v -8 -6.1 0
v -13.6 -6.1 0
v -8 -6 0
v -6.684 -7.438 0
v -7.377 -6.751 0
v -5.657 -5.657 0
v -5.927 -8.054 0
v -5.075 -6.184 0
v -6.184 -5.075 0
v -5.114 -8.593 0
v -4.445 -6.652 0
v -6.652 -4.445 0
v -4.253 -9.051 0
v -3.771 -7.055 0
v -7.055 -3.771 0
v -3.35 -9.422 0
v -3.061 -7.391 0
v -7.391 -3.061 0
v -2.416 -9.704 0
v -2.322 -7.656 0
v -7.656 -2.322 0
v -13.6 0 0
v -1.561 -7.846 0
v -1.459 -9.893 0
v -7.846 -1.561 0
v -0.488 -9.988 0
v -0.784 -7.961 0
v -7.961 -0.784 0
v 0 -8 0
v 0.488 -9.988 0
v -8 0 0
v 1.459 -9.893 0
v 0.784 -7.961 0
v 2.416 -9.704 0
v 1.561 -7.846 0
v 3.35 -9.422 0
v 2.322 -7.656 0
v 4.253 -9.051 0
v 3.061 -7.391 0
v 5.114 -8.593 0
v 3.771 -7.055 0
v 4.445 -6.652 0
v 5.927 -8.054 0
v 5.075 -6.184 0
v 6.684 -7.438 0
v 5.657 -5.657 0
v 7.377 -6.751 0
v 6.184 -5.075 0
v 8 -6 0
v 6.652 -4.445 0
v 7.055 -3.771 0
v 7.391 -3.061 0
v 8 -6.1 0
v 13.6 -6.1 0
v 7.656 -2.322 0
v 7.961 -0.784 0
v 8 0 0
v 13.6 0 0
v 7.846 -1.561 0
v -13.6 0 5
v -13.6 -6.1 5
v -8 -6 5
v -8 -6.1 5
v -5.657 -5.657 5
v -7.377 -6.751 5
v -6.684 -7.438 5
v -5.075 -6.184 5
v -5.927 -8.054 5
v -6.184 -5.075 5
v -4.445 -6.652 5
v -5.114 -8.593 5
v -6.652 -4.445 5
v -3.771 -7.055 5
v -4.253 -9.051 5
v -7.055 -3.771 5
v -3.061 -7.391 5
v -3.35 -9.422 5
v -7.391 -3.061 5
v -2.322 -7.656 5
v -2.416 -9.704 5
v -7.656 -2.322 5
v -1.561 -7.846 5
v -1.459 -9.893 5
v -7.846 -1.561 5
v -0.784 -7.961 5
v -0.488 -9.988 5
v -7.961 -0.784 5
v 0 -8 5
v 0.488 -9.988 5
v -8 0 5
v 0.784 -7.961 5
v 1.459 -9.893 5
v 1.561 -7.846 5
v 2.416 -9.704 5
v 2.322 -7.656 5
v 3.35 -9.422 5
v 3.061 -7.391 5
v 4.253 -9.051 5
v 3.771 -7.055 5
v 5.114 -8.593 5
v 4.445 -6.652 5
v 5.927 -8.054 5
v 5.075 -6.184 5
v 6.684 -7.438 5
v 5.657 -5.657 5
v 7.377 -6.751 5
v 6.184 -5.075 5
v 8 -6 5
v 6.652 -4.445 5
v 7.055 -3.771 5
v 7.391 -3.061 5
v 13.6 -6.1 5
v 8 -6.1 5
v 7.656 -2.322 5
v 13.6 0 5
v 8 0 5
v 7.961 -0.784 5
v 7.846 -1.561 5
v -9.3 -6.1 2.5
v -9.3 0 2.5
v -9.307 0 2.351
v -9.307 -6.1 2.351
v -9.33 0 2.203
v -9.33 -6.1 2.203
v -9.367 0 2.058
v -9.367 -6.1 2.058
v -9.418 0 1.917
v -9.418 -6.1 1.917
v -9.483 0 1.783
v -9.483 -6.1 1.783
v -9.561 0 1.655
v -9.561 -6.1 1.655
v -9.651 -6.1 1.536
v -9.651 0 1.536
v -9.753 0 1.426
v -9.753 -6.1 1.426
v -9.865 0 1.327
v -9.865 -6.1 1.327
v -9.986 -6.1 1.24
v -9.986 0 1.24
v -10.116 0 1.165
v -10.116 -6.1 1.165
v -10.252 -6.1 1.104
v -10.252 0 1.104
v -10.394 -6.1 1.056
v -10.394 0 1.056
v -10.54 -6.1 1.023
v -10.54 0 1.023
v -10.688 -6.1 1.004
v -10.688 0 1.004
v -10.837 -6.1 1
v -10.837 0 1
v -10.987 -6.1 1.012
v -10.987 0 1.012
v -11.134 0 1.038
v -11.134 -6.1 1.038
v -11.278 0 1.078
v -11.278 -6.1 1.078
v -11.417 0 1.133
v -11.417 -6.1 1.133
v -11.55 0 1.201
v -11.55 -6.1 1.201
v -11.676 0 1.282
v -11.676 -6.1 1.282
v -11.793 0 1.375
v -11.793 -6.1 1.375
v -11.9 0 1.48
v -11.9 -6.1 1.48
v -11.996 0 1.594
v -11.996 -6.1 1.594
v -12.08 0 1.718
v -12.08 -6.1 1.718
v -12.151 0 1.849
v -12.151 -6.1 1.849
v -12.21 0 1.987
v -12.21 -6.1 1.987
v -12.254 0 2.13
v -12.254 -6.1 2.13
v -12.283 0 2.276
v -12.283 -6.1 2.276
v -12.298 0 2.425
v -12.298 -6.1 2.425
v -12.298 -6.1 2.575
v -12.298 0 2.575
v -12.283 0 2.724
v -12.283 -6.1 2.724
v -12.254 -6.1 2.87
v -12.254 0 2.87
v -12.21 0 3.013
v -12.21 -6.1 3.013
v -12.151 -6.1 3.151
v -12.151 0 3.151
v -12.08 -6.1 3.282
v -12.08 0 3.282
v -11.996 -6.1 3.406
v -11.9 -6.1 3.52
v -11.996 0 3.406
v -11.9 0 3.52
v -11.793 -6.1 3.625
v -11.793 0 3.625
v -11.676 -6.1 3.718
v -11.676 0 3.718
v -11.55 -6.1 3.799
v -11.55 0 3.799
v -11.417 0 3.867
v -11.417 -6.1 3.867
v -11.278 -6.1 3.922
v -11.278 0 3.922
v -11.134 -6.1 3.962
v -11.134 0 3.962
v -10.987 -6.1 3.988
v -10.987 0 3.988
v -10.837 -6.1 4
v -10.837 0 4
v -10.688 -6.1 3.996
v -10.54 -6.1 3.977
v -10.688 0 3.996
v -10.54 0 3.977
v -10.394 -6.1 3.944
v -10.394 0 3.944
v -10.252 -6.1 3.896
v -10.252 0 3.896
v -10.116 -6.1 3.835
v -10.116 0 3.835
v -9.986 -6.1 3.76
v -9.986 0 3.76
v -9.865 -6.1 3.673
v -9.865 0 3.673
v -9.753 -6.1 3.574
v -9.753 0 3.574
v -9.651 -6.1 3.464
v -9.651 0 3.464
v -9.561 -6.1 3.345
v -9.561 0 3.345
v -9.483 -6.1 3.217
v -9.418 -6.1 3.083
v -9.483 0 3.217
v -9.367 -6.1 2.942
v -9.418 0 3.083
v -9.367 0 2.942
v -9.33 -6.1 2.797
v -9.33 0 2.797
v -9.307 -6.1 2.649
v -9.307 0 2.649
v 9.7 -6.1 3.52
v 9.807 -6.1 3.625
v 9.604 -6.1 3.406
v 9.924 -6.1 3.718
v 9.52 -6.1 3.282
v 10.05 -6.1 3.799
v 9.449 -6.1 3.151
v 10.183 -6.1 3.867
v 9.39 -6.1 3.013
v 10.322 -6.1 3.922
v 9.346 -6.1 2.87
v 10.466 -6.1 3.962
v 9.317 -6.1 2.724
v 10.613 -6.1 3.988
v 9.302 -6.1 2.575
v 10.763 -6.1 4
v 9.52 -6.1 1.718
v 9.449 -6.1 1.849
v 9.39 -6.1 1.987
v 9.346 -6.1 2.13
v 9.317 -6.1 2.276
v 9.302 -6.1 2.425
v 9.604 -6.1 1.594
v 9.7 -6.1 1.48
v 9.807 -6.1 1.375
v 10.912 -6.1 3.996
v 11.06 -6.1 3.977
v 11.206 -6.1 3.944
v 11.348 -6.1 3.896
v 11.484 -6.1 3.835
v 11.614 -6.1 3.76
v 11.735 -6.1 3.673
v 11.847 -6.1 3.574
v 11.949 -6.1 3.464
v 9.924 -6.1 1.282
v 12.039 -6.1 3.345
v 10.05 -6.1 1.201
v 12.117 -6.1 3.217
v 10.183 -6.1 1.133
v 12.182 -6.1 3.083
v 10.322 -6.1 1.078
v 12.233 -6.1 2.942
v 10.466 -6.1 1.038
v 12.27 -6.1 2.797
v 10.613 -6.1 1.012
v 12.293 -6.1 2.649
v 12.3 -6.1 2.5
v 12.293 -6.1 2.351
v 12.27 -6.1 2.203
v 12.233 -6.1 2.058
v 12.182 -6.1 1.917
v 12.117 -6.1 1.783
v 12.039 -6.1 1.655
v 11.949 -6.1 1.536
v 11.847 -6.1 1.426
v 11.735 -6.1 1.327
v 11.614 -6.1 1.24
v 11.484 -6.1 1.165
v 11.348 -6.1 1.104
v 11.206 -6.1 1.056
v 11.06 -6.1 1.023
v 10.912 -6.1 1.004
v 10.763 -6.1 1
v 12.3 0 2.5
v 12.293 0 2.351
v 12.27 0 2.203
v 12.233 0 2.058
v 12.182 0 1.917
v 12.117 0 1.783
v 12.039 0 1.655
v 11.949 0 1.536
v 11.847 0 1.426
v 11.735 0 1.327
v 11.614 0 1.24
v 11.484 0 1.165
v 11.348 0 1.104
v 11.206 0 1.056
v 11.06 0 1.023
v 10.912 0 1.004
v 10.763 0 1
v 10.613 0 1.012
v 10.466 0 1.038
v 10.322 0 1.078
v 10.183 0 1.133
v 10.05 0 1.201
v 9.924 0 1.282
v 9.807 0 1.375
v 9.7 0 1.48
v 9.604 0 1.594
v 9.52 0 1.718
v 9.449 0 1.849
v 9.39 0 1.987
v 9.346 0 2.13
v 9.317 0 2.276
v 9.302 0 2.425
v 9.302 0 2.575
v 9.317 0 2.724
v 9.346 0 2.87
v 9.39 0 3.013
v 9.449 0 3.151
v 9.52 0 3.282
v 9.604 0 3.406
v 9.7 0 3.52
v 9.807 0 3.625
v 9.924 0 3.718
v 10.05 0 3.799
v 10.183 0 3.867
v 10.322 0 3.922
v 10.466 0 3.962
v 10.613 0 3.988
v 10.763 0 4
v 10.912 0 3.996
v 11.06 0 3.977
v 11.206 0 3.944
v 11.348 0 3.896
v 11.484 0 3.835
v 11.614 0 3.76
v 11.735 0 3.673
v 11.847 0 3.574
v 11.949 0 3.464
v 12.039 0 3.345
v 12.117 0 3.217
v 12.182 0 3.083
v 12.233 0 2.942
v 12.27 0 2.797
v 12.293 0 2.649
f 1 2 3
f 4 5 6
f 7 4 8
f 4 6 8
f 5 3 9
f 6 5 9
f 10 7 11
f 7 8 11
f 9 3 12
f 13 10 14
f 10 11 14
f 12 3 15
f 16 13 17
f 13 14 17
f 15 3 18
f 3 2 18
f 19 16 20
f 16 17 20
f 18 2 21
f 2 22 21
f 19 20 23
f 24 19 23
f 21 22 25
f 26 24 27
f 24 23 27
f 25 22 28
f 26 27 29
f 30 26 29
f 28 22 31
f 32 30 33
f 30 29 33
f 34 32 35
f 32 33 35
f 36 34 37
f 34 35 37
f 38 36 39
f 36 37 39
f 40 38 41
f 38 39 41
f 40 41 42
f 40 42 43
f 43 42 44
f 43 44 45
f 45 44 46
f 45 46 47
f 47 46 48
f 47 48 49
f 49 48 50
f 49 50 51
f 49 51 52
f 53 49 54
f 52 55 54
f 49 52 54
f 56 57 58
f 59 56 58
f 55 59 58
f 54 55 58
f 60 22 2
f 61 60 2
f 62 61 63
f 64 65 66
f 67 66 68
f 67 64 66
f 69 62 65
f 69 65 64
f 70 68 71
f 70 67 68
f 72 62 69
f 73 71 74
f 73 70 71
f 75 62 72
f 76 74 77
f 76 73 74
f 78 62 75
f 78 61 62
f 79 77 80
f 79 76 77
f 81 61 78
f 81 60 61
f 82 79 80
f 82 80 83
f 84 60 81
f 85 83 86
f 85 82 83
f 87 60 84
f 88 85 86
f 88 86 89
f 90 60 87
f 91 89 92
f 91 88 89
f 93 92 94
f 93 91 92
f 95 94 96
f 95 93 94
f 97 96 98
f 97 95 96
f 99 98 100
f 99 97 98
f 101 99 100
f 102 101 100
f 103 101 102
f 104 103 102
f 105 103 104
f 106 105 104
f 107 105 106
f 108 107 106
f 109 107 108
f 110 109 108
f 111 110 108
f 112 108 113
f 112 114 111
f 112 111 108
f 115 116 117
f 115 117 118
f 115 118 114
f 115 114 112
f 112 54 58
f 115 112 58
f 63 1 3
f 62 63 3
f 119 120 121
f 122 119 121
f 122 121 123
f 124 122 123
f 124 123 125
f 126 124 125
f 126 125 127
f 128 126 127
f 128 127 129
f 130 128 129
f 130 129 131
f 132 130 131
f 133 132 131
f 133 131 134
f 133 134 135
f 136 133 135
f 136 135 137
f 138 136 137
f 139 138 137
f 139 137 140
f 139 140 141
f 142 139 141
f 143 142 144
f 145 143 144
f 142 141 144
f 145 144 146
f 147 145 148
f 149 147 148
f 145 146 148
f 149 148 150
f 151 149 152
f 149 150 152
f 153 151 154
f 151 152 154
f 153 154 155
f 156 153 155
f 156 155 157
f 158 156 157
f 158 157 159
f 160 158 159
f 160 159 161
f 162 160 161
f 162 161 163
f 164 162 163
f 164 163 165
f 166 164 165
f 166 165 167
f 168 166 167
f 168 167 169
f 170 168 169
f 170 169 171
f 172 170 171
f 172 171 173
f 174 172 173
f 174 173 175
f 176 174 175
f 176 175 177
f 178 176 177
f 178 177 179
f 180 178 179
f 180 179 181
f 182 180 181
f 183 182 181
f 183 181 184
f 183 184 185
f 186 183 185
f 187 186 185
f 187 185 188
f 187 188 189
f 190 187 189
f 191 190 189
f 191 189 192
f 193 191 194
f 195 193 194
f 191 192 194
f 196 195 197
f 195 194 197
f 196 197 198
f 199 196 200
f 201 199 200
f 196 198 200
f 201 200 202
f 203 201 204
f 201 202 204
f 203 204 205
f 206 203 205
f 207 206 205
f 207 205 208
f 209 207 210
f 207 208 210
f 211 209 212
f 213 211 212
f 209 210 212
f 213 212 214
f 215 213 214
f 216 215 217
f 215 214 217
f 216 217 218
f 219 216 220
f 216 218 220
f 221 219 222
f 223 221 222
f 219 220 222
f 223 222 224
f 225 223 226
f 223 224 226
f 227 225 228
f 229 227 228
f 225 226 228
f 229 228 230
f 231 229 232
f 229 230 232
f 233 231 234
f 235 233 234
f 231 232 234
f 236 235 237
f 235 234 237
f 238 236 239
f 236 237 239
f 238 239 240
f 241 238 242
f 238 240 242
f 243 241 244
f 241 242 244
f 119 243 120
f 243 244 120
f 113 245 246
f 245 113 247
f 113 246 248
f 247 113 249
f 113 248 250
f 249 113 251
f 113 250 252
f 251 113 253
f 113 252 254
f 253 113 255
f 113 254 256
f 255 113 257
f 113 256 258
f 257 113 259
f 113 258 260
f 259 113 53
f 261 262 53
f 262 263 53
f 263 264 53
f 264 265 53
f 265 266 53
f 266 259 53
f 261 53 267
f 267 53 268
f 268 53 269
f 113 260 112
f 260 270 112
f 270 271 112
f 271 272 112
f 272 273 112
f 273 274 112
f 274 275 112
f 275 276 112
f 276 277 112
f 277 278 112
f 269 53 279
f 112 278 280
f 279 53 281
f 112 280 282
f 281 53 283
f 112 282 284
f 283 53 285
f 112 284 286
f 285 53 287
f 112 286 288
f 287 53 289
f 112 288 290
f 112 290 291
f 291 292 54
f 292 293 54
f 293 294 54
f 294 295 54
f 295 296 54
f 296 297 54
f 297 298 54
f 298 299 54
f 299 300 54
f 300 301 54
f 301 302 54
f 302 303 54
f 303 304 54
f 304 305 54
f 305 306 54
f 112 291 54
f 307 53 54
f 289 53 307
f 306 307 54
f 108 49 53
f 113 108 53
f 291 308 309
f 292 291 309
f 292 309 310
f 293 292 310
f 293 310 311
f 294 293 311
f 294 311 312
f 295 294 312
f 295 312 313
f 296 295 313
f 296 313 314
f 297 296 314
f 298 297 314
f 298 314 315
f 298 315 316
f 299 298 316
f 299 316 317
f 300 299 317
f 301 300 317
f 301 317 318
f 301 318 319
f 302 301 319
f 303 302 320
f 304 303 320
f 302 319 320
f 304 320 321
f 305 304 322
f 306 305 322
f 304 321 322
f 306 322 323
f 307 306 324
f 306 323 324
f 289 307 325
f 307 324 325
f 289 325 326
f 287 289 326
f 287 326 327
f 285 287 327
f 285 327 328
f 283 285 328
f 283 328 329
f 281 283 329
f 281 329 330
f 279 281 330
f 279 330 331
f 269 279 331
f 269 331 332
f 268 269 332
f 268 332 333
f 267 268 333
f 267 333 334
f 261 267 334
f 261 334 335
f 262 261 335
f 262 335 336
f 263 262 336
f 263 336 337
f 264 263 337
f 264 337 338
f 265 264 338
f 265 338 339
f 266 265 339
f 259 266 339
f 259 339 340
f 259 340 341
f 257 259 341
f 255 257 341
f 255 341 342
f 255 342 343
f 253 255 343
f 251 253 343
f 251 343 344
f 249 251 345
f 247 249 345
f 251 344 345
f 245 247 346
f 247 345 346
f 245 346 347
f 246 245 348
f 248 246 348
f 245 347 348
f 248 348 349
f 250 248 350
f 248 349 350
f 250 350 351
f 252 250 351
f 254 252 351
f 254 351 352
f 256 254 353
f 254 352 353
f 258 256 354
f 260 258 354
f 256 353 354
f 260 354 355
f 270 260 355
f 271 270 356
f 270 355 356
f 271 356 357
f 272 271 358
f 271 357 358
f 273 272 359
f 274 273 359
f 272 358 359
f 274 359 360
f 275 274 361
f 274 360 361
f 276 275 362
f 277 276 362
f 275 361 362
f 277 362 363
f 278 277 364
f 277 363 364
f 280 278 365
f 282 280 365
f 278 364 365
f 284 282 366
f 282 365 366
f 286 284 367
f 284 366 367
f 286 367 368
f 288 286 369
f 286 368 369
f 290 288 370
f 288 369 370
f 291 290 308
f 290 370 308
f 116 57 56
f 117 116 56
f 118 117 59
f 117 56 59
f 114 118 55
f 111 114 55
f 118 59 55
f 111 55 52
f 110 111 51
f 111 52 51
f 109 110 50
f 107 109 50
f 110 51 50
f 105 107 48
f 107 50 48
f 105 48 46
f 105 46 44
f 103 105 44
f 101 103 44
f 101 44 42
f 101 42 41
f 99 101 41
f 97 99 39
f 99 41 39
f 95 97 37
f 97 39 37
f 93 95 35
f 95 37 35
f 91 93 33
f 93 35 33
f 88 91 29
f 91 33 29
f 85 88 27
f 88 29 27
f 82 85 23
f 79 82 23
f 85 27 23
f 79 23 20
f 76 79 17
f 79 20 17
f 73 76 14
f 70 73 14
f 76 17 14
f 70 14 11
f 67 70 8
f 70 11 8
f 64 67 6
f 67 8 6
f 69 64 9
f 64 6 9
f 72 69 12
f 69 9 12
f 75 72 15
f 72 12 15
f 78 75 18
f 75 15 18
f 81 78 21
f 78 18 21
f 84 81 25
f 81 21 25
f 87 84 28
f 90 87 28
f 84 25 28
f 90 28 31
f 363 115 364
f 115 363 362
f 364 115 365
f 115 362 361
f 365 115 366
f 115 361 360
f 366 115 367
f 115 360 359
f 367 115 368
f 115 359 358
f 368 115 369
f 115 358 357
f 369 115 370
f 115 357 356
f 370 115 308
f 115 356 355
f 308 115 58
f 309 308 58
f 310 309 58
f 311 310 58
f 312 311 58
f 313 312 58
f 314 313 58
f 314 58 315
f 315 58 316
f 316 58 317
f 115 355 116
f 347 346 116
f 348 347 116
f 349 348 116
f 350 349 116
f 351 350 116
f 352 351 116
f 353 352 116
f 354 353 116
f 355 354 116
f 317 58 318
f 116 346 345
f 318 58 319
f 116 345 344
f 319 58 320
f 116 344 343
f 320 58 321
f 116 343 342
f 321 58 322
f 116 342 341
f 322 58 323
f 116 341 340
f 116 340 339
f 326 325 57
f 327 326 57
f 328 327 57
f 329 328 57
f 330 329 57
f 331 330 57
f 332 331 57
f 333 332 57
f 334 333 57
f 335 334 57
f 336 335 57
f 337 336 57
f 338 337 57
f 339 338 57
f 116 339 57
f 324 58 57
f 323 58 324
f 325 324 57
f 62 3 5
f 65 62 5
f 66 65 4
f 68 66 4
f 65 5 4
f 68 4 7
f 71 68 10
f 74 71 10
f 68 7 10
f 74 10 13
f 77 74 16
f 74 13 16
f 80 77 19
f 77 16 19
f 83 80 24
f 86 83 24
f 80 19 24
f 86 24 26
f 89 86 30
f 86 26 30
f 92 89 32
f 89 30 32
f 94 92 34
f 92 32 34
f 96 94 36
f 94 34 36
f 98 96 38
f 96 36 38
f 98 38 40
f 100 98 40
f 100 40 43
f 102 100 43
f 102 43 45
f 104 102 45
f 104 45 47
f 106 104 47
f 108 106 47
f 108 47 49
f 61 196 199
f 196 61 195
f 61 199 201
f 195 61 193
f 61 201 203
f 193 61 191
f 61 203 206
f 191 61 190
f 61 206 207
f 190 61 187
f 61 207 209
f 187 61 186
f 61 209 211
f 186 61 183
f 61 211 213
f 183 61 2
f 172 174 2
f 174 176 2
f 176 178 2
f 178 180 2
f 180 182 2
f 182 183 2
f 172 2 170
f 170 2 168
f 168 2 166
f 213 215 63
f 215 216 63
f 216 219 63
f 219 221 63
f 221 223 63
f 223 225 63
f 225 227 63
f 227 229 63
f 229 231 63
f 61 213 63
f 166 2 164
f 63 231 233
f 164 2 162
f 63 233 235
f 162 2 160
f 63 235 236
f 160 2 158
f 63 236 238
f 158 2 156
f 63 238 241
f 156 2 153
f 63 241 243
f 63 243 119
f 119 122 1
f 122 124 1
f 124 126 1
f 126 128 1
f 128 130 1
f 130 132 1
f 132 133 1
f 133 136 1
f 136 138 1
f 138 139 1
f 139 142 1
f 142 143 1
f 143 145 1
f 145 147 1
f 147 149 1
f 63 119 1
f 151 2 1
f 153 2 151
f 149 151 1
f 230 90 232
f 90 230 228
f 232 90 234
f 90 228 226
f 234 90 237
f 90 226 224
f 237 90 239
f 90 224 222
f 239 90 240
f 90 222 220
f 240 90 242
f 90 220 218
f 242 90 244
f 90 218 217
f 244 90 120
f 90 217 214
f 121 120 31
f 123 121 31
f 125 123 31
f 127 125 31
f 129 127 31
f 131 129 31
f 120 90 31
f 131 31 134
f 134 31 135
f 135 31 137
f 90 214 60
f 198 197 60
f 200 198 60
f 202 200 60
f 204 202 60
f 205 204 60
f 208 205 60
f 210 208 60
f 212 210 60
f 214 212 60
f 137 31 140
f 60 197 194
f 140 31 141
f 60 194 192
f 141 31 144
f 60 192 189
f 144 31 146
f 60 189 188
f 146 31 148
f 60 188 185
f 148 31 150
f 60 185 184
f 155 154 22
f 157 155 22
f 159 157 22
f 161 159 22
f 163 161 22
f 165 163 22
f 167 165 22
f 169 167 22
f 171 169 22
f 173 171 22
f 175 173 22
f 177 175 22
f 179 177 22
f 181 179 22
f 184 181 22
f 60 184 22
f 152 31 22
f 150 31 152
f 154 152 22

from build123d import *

# Parameters (mm, degrees)
BOSS_EXTRUDE1_DEPTH = 5
SKETCH3_R           = 1.5
CUT_EXTRUDE1_DEPTH  = 10


with BuildPart() as part:
    # Sketch2 → Boss-Extrude1 (new body)
    with BuildSketch(Plane.XY):
        with BuildLine():
            ThreePointArc((-8, -6), (0, -10), (8, -6))
            Line((8, -6), (8, -6.1))
            Line((8, -6.1), (13.6, -6.1))
            Line((13.6, -6.1), (13.6, 0))
            Line((13.6, 0), (8, 0))
            ThreePointArc((8, 0), (0, -8), (-8, 0))
            Line((-8, 0), (-13.6, 0))
            Line((-13.6, 0), (-13.6, -6.1))
            Line((-13.6, -6.1), (-8, -6.1))
            Line((-8, -6.1), (-8, -6))
        make_face()
    extrude(amount=BOSS_EXTRUDE1_DEPTH)

    # Sketch3 → Cut-Extrude1 (cut)
    with BuildSketch(Plane(origin=(0, 0, 0), x_dir=(1, 0, 0), z_dir=(0, 1, 0))):
        with Locations((-10.8, -2.5)):
            Circle(SKETCH3_R)
        with Locations((10.8, -2.5)):
            Circle(SKETCH3_R)
    extrude(amount=-CUT_EXTRUDE1_DEPTH, mode=Mode.SUBTRACT)


solid = part.part
